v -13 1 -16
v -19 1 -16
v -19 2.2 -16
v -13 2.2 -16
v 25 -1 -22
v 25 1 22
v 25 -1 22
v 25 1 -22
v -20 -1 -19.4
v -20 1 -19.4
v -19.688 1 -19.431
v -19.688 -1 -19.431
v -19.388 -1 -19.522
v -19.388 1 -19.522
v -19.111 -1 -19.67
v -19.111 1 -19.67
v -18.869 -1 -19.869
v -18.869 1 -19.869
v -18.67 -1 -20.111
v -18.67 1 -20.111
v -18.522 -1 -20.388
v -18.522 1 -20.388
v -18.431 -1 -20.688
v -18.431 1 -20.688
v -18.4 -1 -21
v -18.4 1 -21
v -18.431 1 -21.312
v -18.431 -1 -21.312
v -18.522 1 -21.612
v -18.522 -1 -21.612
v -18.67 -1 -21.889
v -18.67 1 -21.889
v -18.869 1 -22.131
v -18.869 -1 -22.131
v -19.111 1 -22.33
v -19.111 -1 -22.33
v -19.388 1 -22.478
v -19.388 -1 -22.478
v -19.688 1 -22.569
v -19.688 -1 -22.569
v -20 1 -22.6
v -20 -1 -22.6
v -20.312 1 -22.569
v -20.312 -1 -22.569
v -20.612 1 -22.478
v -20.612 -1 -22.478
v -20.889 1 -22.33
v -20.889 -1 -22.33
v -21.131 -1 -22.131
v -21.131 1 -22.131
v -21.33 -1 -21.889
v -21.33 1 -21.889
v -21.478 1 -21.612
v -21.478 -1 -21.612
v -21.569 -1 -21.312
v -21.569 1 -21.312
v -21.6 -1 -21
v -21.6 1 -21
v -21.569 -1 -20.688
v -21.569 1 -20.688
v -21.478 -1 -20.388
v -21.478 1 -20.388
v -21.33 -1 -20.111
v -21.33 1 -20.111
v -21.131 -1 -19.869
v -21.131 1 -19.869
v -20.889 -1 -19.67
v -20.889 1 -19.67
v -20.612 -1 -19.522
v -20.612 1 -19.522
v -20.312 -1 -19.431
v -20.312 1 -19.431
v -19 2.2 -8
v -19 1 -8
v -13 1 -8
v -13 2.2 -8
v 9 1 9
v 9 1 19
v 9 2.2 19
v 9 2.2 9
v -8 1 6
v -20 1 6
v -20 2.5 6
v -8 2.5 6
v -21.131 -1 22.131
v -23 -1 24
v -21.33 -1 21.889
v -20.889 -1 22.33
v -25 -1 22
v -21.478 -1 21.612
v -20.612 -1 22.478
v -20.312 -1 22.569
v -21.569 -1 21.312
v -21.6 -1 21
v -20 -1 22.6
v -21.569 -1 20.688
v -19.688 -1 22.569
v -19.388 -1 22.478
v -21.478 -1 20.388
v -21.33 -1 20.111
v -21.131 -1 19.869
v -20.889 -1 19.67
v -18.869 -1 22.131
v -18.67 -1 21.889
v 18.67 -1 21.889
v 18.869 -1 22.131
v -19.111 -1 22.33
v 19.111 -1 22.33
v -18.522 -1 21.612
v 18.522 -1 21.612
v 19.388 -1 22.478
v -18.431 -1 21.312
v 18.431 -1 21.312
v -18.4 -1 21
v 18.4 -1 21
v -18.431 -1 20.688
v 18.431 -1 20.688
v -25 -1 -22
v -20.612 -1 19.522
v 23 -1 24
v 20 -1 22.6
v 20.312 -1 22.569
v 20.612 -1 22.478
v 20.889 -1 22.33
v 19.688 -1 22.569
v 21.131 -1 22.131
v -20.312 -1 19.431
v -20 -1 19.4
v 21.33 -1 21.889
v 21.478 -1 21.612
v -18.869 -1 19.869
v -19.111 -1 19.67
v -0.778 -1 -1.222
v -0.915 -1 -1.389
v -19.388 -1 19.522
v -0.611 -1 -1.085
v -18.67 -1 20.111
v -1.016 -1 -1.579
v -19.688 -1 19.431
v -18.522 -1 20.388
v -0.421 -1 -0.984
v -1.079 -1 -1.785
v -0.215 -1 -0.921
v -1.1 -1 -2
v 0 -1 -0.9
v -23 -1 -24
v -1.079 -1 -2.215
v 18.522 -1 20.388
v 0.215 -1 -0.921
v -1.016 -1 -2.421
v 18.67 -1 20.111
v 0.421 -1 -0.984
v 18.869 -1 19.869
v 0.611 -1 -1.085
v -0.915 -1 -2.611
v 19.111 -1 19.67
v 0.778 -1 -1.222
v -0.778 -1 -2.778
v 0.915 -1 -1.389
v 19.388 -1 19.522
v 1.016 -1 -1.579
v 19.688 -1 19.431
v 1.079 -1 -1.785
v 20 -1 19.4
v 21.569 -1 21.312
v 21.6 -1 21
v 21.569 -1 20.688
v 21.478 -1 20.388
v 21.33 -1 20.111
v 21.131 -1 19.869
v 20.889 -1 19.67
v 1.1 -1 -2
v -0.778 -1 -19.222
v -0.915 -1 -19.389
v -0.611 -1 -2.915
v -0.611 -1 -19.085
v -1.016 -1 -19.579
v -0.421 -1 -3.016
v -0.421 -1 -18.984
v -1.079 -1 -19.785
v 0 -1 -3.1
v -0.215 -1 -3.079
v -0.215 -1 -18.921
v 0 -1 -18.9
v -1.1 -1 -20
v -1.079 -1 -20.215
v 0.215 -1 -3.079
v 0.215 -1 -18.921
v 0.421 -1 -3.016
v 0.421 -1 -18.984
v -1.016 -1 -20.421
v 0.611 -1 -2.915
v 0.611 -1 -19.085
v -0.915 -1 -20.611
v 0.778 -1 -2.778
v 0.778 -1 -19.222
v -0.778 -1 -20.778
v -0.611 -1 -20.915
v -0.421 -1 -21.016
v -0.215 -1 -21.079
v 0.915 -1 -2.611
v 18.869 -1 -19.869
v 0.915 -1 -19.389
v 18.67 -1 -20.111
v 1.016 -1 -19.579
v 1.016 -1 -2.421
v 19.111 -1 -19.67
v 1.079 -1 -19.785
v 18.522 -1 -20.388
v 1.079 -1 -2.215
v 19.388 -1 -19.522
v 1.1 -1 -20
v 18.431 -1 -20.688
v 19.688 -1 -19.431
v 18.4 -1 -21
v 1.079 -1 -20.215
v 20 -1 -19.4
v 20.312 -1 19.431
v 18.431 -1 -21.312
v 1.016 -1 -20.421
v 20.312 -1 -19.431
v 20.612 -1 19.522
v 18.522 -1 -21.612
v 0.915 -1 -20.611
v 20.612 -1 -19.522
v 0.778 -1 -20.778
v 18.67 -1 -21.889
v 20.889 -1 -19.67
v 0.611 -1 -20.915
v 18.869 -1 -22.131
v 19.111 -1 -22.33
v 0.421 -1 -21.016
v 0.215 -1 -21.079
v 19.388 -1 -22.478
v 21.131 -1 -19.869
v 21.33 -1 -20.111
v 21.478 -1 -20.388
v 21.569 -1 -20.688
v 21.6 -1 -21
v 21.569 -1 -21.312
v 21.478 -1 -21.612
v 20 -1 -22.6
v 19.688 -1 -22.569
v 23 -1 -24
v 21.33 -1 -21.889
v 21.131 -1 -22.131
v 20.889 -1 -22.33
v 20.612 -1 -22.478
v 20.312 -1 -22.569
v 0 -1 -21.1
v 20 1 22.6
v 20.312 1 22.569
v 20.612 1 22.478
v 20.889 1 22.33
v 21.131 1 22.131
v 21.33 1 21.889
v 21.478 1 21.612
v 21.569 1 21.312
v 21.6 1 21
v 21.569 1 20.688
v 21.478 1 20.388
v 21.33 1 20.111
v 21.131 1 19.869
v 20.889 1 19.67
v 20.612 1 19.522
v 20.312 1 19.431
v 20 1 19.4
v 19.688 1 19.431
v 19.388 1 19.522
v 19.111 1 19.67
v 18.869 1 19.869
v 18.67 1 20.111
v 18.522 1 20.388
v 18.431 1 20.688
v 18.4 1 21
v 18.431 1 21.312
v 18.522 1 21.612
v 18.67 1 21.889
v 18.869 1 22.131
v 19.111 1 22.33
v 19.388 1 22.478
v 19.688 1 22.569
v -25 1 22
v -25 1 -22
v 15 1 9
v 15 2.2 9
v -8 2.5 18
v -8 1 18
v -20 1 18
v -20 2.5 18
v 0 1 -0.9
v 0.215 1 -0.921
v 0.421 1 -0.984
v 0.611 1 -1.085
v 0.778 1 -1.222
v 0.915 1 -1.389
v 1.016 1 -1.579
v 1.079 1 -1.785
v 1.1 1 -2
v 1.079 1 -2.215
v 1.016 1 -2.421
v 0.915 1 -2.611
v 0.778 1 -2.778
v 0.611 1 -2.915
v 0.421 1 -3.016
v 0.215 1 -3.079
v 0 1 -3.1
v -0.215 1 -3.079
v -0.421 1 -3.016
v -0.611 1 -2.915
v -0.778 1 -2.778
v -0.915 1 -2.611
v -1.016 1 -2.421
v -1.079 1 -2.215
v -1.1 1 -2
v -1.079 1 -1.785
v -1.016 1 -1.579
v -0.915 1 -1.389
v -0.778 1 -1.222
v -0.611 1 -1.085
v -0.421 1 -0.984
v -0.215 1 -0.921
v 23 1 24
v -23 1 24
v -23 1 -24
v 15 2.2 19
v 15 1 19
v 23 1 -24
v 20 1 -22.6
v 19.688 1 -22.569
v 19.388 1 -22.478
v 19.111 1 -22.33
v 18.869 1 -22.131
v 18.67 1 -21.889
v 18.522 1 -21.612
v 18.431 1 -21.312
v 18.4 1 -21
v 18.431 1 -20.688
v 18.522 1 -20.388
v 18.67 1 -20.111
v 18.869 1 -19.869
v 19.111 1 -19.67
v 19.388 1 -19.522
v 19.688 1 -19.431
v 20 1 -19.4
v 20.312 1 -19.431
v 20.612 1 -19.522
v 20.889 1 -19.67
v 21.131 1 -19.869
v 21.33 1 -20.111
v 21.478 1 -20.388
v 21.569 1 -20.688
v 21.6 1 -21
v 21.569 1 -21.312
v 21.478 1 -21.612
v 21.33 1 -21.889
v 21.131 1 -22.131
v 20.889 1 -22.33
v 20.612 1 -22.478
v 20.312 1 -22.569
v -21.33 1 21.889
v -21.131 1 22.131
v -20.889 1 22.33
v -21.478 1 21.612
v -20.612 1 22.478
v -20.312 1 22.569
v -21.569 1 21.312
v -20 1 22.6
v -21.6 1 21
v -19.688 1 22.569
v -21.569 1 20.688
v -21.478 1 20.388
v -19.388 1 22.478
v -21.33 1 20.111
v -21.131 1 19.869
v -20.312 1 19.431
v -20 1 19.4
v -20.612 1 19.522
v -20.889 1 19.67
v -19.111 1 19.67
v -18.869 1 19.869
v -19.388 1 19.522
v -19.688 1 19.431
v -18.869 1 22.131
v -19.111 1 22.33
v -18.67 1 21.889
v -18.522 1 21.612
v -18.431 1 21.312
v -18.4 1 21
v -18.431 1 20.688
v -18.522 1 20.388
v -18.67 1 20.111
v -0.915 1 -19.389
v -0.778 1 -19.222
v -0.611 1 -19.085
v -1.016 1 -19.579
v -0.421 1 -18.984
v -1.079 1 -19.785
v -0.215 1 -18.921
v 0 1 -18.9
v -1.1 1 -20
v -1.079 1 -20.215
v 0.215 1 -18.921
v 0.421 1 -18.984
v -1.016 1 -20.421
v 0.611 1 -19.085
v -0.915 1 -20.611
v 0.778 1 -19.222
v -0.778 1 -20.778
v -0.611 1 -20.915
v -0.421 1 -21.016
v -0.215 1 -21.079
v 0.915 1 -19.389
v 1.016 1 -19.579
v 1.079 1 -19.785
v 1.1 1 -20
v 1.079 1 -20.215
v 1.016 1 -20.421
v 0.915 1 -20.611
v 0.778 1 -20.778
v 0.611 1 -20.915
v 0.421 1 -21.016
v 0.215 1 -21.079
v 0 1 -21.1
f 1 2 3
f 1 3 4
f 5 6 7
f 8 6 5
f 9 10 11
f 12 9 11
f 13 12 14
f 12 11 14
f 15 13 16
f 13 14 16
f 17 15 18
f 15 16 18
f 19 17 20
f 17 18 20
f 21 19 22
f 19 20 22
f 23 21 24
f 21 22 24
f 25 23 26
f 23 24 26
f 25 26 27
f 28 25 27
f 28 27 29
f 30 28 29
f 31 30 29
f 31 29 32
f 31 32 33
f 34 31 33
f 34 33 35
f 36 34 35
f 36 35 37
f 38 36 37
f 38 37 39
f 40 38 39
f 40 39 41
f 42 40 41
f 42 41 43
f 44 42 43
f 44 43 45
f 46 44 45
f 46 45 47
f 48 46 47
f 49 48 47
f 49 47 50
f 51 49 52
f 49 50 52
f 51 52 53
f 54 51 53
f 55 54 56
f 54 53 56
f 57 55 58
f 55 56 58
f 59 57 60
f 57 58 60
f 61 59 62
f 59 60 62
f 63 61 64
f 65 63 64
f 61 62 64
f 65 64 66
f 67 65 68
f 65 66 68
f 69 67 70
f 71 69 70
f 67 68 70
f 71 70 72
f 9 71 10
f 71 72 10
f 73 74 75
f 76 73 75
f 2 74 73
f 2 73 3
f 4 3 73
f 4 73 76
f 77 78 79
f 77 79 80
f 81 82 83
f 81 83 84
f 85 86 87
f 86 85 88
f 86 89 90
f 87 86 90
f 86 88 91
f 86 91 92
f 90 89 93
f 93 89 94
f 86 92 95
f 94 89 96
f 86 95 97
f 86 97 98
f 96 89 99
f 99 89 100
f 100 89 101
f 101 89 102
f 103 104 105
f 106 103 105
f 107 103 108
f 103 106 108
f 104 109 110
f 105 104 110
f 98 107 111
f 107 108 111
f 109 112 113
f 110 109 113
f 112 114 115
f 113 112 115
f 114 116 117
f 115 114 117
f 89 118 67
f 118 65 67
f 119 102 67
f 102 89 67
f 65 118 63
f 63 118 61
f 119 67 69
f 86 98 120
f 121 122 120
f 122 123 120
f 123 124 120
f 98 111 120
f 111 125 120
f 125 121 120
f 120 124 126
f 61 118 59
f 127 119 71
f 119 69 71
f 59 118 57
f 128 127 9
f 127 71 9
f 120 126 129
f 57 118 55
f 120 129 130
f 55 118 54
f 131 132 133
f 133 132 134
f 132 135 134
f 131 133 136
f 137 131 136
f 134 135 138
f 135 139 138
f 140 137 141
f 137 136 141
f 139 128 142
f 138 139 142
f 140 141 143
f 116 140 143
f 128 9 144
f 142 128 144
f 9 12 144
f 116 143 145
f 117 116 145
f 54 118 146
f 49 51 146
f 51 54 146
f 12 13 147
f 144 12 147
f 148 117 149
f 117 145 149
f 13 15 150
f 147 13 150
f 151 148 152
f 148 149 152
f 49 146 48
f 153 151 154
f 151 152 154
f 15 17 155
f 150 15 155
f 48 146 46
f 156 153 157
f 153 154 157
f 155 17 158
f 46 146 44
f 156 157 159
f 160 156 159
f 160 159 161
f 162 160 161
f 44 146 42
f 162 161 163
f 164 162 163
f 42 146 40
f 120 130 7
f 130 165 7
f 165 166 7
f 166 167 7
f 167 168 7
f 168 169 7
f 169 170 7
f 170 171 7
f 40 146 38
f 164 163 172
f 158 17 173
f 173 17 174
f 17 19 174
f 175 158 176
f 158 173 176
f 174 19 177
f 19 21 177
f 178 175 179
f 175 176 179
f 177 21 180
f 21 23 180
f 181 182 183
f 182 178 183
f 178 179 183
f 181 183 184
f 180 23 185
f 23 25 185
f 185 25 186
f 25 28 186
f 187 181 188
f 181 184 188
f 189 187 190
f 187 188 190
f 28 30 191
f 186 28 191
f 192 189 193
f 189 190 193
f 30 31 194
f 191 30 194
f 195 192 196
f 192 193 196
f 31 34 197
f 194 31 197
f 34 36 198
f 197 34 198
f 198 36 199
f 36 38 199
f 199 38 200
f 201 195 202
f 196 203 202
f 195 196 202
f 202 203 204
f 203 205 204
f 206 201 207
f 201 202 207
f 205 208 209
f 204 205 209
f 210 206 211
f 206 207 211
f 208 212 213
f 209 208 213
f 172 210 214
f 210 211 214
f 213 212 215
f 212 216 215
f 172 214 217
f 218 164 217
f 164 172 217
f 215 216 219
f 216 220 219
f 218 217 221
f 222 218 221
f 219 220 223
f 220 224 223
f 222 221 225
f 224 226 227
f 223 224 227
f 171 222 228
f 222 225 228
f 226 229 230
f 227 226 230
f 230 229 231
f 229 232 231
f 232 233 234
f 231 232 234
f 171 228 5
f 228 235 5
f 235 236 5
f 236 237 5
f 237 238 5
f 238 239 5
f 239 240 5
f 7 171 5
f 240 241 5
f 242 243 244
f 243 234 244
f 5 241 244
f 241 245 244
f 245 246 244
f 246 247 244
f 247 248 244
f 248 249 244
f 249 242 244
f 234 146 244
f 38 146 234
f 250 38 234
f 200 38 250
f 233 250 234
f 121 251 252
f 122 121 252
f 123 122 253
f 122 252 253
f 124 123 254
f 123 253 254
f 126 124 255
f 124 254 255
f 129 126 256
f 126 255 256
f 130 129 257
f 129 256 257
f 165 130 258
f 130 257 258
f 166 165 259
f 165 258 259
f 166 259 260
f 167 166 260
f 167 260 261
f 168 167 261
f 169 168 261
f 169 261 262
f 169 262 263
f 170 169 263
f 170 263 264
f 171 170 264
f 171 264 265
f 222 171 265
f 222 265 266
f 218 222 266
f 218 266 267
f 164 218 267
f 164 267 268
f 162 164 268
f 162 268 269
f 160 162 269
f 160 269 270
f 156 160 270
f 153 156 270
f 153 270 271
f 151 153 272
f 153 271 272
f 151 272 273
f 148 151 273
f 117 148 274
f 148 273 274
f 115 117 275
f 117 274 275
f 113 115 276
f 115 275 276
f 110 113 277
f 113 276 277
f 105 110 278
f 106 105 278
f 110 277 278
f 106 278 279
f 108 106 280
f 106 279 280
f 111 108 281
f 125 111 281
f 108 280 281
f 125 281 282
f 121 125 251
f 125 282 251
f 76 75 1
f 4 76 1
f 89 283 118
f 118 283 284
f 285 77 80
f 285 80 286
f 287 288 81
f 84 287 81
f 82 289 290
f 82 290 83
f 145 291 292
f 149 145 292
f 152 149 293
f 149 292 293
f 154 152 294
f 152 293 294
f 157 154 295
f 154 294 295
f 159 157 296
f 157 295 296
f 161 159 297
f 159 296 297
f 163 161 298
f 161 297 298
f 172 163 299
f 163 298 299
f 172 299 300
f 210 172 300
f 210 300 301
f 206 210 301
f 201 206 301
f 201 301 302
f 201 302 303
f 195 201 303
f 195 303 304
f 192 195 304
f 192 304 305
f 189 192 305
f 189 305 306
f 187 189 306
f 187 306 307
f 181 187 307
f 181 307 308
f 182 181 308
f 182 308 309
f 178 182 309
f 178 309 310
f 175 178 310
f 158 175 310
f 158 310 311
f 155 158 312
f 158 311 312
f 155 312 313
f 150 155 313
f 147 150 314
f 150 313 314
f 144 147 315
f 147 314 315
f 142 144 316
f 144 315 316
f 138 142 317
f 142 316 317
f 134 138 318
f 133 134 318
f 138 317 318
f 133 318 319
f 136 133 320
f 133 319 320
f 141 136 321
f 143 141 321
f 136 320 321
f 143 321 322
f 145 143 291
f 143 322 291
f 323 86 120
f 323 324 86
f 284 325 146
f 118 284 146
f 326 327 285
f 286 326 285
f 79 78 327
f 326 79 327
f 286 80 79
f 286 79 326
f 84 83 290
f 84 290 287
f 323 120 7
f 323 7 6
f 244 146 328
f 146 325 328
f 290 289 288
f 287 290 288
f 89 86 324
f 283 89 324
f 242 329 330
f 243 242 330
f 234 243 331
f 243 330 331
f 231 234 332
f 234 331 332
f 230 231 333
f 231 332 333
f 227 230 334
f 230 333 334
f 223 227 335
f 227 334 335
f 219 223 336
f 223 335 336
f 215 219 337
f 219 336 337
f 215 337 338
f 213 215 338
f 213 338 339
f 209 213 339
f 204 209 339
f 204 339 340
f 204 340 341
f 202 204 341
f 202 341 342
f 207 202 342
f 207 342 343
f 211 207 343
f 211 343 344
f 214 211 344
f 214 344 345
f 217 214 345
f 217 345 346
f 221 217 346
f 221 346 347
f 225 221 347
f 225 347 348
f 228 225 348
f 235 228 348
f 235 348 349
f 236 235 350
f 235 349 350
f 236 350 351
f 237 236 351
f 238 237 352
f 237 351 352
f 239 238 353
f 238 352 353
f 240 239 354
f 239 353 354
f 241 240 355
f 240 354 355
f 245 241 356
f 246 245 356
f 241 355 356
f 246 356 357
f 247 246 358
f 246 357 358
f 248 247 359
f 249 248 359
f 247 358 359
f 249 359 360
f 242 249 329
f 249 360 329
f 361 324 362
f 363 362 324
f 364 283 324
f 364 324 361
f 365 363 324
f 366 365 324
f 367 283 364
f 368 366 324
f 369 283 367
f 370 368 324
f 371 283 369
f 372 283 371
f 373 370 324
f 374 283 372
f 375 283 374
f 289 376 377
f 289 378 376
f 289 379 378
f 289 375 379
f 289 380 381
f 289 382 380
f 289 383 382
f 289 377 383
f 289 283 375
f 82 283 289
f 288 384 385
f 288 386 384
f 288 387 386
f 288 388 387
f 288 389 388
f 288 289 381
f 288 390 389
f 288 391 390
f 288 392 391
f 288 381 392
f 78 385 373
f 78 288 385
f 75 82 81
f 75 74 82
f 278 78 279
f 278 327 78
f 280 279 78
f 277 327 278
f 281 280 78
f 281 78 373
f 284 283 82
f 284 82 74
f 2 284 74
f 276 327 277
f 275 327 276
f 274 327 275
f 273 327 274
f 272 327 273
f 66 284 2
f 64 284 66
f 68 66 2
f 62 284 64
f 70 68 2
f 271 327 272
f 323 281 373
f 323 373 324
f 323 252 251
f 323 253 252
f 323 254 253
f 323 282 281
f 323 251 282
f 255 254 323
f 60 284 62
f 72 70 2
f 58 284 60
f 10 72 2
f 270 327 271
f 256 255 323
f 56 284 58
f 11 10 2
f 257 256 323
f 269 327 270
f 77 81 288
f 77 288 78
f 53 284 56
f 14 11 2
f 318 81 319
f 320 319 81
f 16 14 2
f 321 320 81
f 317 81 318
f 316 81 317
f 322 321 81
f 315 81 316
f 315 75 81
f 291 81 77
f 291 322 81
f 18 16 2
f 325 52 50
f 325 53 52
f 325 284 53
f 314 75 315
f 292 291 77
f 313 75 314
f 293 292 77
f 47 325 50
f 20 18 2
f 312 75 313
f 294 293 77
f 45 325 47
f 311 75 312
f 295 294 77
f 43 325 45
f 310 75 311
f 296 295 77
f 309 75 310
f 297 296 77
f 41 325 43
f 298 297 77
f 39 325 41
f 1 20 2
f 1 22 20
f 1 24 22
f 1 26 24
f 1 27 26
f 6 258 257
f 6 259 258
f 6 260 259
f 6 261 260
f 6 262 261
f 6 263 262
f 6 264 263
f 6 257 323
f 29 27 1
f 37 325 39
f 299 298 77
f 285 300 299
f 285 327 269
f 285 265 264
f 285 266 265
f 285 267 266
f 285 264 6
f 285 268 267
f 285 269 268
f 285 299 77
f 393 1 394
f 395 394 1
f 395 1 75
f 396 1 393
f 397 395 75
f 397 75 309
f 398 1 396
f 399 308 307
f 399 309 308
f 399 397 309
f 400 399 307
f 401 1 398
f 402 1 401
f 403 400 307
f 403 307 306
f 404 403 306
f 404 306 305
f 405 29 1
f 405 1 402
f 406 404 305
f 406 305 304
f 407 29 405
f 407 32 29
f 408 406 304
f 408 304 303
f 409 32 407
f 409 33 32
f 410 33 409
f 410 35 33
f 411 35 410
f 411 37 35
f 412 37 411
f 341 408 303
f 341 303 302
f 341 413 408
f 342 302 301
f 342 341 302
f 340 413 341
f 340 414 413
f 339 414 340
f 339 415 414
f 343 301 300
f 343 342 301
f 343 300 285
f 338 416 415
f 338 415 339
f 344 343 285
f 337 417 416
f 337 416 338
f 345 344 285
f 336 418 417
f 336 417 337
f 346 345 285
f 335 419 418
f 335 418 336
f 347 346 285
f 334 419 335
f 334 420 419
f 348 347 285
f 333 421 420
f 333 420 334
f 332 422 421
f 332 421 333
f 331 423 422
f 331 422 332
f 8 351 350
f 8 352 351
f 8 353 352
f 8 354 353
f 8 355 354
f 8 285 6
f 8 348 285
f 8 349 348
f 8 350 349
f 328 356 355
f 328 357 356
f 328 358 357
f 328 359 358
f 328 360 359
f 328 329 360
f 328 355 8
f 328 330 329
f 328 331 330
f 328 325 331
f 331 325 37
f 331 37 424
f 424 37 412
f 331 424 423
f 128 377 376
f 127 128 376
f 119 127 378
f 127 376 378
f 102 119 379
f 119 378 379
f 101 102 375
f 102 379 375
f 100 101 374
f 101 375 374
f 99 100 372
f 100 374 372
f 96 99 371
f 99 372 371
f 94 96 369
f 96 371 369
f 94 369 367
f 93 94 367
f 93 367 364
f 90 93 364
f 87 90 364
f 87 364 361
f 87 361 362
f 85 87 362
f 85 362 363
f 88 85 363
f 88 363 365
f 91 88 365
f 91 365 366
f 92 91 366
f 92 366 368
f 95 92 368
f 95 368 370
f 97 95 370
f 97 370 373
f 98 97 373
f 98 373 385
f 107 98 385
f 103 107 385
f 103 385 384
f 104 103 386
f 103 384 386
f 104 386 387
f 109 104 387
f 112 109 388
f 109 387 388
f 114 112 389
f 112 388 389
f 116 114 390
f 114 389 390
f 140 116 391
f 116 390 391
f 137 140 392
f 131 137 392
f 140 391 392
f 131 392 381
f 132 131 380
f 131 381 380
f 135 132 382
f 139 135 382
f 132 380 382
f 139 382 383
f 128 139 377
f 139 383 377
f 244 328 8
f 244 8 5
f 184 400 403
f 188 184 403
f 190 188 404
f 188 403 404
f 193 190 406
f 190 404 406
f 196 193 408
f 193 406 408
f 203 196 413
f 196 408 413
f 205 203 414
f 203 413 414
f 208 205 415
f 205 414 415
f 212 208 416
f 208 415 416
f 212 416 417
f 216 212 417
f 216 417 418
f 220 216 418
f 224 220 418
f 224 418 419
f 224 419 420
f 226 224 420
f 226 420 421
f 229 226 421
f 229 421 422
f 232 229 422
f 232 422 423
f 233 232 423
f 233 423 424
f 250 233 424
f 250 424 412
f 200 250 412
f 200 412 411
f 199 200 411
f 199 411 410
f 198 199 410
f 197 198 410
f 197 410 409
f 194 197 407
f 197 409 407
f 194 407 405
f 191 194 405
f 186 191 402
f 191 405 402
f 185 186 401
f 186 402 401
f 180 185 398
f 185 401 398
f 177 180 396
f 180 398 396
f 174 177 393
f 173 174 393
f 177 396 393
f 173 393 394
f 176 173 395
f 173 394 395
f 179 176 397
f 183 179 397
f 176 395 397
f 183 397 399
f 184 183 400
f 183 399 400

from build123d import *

# Parameters (mm, degrees)
SKETCH2_W           = 50
SKETCH2_H           = 48
BOSS_EXTRUDE1_DEPTH = 1
CHAMFER1_SIZE       = 2
SKETCH3_R           = 1.6
SKETCH3_R_2         = 1.1
CUT_EXTRUDE1_DEPTH  = 35.713109915
SKETCH5_W           = 12
SKETCH5_H           = 12
BOSS_EXTRUDE2_DEPTH = 1.5
SKETCH6_W           = 6
SKETCH6_H           = 8
SKETCH6_H_2         = 10
BOSS_EXTRUDE3_DEPTH = 1.2


with BuildPart() as part:
    # Sketch2 → Boss-Extrude1 (new, symmetric)
    with BuildSketch(Plane(origin=(0, 0, 0), x_dir=(1, 0, 0), z_dir=(0, 1, 0))):
        Rectangle(SKETCH2_W, SKETCH2_H)
    extrude(amount=BOSS_EXTRUDE1_DEPTH, both=True)

    # Chamfer1
    chamfer1_edges = [part.edges().sort_by_distance(p)[0] for p in [
        (-25, 0, -24),
        (25, 0, -24),
        (25, 0, 24),
        (-25, 0, 24),
    ]]
    chamfer(chamfer1_edges, length=CHAMFER1_SIZE)

    # Sketch3 → Cut-Extrude1 (cut, through all)
    with BuildSketch(Plane(origin=(0, 1, 0), x_dir=(1, 0, 0), z_dir=(0, 1, 0))):
        with Locations(Location((-20, 21, 0), (0, 0, 270))):
            Circle(SKETCH3_R)
        with Locations(Location((20, 21, 0), (0, 0, 90))):
            Circle(SKETCH3_R)
        with Locations(Location((20, -21, 0), (0, 0, 270))):
            Circle(SKETCH3_R)
        with Locations(Location((-20, -21, 0), (0, 0, 90))):
            Circle(SKETCH3_R)
        with Locations(Location((0, 20, 0), (0, 0, 270))):
            Circle(SKETCH3_R_2)
        with Locations(Location((0, 2, 0), (0, 0, 270))):
            Circle(SKETCH3_R_2)
    extrude(amount=-CUT_EXTRUDE1_DEPTH, mode=Mode.SUBTRACT)

    # Sketch5 → Boss-Extrude2 (add)
    with BuildSketch(Plane(origin=(0, 1, 0), x_dir=(1, 0, 0), z_dir=(0, 1, 0))):
        with Locations((-14, -12)):
            Rectangle(SKETCH5_W, SKETCH5_H)
    extrude(amount=BOSS_EXTRUDE2_DEPTH)

    # Sketch6 → Boss-Extrude3 (add)
    with BuildSketch(Plane(origin=(0, 1, 0), x_dir=(1, 0, 0), z_dir=(0, 1, 0))):
        with Locations((-16, 12)):
            Rectangle(SKETCH6_W, SKETCH6_H)
        with Locations((12, -14)):
            Rectangle(SKETCH6_W, SKETCH6_H_2)
    extrude(amount=BOSS_EXTRUDE3_DEPTH)


solid = part.part
